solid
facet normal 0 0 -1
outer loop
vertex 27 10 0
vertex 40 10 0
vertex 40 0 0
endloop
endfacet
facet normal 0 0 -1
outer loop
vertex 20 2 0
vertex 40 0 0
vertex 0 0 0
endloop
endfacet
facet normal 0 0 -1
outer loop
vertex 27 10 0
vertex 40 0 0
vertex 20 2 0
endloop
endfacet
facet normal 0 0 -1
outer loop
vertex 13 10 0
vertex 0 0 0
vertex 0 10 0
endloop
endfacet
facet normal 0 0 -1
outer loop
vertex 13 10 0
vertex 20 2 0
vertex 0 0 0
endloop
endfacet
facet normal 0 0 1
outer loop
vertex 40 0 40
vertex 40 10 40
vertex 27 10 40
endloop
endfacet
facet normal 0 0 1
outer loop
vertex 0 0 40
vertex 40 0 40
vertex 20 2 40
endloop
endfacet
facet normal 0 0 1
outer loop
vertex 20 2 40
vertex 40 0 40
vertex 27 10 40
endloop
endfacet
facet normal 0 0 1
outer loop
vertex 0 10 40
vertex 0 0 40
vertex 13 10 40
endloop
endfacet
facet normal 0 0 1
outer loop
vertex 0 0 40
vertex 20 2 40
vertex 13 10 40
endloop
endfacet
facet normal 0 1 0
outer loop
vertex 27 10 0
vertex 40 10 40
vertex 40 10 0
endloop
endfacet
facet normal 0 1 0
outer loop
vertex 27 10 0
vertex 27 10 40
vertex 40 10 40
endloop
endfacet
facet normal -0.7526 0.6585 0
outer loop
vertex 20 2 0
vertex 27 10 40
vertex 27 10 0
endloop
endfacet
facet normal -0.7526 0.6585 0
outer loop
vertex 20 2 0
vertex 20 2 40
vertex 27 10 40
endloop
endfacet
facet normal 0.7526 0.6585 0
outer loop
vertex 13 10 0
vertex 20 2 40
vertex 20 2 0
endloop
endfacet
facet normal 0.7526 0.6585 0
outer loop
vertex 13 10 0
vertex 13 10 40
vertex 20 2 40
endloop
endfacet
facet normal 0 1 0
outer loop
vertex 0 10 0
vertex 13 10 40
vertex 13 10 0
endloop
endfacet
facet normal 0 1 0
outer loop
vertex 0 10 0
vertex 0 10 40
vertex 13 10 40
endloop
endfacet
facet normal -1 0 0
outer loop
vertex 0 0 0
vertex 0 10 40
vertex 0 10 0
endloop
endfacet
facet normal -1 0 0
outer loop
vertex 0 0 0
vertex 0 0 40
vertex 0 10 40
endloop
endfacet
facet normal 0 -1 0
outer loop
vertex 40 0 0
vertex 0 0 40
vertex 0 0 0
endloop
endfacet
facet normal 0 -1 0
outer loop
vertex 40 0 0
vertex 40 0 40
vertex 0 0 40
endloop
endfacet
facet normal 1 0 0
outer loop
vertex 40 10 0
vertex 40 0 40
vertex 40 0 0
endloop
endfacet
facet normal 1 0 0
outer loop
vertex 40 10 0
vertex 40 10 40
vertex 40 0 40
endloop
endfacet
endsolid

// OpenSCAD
$fn = 32;

// ----------------------------------------------------------------------
// V guide rail: vway, 40 mm wide
// ----------------------------------------------------------------------

// --- parameters (mm) ---
rail_w = 40;              // rail width, X
base_t = 10;              // base plate thickness
v_depth = 8;              // V feature depth / height
v_half_w = 7;             // half width of the V at the base face
plate_t = 40;             // rail length, Z (the extrusion height)

profile = [[0, 0], [40, 0], [40, 10], [27, 10], [20, 2], [13, 10], [0, 10]];  // primary outline, 7 points, counter clockwise

// --- the one profile operation ---
linear_extrude(height = plate_t) polygon(points = profile);
